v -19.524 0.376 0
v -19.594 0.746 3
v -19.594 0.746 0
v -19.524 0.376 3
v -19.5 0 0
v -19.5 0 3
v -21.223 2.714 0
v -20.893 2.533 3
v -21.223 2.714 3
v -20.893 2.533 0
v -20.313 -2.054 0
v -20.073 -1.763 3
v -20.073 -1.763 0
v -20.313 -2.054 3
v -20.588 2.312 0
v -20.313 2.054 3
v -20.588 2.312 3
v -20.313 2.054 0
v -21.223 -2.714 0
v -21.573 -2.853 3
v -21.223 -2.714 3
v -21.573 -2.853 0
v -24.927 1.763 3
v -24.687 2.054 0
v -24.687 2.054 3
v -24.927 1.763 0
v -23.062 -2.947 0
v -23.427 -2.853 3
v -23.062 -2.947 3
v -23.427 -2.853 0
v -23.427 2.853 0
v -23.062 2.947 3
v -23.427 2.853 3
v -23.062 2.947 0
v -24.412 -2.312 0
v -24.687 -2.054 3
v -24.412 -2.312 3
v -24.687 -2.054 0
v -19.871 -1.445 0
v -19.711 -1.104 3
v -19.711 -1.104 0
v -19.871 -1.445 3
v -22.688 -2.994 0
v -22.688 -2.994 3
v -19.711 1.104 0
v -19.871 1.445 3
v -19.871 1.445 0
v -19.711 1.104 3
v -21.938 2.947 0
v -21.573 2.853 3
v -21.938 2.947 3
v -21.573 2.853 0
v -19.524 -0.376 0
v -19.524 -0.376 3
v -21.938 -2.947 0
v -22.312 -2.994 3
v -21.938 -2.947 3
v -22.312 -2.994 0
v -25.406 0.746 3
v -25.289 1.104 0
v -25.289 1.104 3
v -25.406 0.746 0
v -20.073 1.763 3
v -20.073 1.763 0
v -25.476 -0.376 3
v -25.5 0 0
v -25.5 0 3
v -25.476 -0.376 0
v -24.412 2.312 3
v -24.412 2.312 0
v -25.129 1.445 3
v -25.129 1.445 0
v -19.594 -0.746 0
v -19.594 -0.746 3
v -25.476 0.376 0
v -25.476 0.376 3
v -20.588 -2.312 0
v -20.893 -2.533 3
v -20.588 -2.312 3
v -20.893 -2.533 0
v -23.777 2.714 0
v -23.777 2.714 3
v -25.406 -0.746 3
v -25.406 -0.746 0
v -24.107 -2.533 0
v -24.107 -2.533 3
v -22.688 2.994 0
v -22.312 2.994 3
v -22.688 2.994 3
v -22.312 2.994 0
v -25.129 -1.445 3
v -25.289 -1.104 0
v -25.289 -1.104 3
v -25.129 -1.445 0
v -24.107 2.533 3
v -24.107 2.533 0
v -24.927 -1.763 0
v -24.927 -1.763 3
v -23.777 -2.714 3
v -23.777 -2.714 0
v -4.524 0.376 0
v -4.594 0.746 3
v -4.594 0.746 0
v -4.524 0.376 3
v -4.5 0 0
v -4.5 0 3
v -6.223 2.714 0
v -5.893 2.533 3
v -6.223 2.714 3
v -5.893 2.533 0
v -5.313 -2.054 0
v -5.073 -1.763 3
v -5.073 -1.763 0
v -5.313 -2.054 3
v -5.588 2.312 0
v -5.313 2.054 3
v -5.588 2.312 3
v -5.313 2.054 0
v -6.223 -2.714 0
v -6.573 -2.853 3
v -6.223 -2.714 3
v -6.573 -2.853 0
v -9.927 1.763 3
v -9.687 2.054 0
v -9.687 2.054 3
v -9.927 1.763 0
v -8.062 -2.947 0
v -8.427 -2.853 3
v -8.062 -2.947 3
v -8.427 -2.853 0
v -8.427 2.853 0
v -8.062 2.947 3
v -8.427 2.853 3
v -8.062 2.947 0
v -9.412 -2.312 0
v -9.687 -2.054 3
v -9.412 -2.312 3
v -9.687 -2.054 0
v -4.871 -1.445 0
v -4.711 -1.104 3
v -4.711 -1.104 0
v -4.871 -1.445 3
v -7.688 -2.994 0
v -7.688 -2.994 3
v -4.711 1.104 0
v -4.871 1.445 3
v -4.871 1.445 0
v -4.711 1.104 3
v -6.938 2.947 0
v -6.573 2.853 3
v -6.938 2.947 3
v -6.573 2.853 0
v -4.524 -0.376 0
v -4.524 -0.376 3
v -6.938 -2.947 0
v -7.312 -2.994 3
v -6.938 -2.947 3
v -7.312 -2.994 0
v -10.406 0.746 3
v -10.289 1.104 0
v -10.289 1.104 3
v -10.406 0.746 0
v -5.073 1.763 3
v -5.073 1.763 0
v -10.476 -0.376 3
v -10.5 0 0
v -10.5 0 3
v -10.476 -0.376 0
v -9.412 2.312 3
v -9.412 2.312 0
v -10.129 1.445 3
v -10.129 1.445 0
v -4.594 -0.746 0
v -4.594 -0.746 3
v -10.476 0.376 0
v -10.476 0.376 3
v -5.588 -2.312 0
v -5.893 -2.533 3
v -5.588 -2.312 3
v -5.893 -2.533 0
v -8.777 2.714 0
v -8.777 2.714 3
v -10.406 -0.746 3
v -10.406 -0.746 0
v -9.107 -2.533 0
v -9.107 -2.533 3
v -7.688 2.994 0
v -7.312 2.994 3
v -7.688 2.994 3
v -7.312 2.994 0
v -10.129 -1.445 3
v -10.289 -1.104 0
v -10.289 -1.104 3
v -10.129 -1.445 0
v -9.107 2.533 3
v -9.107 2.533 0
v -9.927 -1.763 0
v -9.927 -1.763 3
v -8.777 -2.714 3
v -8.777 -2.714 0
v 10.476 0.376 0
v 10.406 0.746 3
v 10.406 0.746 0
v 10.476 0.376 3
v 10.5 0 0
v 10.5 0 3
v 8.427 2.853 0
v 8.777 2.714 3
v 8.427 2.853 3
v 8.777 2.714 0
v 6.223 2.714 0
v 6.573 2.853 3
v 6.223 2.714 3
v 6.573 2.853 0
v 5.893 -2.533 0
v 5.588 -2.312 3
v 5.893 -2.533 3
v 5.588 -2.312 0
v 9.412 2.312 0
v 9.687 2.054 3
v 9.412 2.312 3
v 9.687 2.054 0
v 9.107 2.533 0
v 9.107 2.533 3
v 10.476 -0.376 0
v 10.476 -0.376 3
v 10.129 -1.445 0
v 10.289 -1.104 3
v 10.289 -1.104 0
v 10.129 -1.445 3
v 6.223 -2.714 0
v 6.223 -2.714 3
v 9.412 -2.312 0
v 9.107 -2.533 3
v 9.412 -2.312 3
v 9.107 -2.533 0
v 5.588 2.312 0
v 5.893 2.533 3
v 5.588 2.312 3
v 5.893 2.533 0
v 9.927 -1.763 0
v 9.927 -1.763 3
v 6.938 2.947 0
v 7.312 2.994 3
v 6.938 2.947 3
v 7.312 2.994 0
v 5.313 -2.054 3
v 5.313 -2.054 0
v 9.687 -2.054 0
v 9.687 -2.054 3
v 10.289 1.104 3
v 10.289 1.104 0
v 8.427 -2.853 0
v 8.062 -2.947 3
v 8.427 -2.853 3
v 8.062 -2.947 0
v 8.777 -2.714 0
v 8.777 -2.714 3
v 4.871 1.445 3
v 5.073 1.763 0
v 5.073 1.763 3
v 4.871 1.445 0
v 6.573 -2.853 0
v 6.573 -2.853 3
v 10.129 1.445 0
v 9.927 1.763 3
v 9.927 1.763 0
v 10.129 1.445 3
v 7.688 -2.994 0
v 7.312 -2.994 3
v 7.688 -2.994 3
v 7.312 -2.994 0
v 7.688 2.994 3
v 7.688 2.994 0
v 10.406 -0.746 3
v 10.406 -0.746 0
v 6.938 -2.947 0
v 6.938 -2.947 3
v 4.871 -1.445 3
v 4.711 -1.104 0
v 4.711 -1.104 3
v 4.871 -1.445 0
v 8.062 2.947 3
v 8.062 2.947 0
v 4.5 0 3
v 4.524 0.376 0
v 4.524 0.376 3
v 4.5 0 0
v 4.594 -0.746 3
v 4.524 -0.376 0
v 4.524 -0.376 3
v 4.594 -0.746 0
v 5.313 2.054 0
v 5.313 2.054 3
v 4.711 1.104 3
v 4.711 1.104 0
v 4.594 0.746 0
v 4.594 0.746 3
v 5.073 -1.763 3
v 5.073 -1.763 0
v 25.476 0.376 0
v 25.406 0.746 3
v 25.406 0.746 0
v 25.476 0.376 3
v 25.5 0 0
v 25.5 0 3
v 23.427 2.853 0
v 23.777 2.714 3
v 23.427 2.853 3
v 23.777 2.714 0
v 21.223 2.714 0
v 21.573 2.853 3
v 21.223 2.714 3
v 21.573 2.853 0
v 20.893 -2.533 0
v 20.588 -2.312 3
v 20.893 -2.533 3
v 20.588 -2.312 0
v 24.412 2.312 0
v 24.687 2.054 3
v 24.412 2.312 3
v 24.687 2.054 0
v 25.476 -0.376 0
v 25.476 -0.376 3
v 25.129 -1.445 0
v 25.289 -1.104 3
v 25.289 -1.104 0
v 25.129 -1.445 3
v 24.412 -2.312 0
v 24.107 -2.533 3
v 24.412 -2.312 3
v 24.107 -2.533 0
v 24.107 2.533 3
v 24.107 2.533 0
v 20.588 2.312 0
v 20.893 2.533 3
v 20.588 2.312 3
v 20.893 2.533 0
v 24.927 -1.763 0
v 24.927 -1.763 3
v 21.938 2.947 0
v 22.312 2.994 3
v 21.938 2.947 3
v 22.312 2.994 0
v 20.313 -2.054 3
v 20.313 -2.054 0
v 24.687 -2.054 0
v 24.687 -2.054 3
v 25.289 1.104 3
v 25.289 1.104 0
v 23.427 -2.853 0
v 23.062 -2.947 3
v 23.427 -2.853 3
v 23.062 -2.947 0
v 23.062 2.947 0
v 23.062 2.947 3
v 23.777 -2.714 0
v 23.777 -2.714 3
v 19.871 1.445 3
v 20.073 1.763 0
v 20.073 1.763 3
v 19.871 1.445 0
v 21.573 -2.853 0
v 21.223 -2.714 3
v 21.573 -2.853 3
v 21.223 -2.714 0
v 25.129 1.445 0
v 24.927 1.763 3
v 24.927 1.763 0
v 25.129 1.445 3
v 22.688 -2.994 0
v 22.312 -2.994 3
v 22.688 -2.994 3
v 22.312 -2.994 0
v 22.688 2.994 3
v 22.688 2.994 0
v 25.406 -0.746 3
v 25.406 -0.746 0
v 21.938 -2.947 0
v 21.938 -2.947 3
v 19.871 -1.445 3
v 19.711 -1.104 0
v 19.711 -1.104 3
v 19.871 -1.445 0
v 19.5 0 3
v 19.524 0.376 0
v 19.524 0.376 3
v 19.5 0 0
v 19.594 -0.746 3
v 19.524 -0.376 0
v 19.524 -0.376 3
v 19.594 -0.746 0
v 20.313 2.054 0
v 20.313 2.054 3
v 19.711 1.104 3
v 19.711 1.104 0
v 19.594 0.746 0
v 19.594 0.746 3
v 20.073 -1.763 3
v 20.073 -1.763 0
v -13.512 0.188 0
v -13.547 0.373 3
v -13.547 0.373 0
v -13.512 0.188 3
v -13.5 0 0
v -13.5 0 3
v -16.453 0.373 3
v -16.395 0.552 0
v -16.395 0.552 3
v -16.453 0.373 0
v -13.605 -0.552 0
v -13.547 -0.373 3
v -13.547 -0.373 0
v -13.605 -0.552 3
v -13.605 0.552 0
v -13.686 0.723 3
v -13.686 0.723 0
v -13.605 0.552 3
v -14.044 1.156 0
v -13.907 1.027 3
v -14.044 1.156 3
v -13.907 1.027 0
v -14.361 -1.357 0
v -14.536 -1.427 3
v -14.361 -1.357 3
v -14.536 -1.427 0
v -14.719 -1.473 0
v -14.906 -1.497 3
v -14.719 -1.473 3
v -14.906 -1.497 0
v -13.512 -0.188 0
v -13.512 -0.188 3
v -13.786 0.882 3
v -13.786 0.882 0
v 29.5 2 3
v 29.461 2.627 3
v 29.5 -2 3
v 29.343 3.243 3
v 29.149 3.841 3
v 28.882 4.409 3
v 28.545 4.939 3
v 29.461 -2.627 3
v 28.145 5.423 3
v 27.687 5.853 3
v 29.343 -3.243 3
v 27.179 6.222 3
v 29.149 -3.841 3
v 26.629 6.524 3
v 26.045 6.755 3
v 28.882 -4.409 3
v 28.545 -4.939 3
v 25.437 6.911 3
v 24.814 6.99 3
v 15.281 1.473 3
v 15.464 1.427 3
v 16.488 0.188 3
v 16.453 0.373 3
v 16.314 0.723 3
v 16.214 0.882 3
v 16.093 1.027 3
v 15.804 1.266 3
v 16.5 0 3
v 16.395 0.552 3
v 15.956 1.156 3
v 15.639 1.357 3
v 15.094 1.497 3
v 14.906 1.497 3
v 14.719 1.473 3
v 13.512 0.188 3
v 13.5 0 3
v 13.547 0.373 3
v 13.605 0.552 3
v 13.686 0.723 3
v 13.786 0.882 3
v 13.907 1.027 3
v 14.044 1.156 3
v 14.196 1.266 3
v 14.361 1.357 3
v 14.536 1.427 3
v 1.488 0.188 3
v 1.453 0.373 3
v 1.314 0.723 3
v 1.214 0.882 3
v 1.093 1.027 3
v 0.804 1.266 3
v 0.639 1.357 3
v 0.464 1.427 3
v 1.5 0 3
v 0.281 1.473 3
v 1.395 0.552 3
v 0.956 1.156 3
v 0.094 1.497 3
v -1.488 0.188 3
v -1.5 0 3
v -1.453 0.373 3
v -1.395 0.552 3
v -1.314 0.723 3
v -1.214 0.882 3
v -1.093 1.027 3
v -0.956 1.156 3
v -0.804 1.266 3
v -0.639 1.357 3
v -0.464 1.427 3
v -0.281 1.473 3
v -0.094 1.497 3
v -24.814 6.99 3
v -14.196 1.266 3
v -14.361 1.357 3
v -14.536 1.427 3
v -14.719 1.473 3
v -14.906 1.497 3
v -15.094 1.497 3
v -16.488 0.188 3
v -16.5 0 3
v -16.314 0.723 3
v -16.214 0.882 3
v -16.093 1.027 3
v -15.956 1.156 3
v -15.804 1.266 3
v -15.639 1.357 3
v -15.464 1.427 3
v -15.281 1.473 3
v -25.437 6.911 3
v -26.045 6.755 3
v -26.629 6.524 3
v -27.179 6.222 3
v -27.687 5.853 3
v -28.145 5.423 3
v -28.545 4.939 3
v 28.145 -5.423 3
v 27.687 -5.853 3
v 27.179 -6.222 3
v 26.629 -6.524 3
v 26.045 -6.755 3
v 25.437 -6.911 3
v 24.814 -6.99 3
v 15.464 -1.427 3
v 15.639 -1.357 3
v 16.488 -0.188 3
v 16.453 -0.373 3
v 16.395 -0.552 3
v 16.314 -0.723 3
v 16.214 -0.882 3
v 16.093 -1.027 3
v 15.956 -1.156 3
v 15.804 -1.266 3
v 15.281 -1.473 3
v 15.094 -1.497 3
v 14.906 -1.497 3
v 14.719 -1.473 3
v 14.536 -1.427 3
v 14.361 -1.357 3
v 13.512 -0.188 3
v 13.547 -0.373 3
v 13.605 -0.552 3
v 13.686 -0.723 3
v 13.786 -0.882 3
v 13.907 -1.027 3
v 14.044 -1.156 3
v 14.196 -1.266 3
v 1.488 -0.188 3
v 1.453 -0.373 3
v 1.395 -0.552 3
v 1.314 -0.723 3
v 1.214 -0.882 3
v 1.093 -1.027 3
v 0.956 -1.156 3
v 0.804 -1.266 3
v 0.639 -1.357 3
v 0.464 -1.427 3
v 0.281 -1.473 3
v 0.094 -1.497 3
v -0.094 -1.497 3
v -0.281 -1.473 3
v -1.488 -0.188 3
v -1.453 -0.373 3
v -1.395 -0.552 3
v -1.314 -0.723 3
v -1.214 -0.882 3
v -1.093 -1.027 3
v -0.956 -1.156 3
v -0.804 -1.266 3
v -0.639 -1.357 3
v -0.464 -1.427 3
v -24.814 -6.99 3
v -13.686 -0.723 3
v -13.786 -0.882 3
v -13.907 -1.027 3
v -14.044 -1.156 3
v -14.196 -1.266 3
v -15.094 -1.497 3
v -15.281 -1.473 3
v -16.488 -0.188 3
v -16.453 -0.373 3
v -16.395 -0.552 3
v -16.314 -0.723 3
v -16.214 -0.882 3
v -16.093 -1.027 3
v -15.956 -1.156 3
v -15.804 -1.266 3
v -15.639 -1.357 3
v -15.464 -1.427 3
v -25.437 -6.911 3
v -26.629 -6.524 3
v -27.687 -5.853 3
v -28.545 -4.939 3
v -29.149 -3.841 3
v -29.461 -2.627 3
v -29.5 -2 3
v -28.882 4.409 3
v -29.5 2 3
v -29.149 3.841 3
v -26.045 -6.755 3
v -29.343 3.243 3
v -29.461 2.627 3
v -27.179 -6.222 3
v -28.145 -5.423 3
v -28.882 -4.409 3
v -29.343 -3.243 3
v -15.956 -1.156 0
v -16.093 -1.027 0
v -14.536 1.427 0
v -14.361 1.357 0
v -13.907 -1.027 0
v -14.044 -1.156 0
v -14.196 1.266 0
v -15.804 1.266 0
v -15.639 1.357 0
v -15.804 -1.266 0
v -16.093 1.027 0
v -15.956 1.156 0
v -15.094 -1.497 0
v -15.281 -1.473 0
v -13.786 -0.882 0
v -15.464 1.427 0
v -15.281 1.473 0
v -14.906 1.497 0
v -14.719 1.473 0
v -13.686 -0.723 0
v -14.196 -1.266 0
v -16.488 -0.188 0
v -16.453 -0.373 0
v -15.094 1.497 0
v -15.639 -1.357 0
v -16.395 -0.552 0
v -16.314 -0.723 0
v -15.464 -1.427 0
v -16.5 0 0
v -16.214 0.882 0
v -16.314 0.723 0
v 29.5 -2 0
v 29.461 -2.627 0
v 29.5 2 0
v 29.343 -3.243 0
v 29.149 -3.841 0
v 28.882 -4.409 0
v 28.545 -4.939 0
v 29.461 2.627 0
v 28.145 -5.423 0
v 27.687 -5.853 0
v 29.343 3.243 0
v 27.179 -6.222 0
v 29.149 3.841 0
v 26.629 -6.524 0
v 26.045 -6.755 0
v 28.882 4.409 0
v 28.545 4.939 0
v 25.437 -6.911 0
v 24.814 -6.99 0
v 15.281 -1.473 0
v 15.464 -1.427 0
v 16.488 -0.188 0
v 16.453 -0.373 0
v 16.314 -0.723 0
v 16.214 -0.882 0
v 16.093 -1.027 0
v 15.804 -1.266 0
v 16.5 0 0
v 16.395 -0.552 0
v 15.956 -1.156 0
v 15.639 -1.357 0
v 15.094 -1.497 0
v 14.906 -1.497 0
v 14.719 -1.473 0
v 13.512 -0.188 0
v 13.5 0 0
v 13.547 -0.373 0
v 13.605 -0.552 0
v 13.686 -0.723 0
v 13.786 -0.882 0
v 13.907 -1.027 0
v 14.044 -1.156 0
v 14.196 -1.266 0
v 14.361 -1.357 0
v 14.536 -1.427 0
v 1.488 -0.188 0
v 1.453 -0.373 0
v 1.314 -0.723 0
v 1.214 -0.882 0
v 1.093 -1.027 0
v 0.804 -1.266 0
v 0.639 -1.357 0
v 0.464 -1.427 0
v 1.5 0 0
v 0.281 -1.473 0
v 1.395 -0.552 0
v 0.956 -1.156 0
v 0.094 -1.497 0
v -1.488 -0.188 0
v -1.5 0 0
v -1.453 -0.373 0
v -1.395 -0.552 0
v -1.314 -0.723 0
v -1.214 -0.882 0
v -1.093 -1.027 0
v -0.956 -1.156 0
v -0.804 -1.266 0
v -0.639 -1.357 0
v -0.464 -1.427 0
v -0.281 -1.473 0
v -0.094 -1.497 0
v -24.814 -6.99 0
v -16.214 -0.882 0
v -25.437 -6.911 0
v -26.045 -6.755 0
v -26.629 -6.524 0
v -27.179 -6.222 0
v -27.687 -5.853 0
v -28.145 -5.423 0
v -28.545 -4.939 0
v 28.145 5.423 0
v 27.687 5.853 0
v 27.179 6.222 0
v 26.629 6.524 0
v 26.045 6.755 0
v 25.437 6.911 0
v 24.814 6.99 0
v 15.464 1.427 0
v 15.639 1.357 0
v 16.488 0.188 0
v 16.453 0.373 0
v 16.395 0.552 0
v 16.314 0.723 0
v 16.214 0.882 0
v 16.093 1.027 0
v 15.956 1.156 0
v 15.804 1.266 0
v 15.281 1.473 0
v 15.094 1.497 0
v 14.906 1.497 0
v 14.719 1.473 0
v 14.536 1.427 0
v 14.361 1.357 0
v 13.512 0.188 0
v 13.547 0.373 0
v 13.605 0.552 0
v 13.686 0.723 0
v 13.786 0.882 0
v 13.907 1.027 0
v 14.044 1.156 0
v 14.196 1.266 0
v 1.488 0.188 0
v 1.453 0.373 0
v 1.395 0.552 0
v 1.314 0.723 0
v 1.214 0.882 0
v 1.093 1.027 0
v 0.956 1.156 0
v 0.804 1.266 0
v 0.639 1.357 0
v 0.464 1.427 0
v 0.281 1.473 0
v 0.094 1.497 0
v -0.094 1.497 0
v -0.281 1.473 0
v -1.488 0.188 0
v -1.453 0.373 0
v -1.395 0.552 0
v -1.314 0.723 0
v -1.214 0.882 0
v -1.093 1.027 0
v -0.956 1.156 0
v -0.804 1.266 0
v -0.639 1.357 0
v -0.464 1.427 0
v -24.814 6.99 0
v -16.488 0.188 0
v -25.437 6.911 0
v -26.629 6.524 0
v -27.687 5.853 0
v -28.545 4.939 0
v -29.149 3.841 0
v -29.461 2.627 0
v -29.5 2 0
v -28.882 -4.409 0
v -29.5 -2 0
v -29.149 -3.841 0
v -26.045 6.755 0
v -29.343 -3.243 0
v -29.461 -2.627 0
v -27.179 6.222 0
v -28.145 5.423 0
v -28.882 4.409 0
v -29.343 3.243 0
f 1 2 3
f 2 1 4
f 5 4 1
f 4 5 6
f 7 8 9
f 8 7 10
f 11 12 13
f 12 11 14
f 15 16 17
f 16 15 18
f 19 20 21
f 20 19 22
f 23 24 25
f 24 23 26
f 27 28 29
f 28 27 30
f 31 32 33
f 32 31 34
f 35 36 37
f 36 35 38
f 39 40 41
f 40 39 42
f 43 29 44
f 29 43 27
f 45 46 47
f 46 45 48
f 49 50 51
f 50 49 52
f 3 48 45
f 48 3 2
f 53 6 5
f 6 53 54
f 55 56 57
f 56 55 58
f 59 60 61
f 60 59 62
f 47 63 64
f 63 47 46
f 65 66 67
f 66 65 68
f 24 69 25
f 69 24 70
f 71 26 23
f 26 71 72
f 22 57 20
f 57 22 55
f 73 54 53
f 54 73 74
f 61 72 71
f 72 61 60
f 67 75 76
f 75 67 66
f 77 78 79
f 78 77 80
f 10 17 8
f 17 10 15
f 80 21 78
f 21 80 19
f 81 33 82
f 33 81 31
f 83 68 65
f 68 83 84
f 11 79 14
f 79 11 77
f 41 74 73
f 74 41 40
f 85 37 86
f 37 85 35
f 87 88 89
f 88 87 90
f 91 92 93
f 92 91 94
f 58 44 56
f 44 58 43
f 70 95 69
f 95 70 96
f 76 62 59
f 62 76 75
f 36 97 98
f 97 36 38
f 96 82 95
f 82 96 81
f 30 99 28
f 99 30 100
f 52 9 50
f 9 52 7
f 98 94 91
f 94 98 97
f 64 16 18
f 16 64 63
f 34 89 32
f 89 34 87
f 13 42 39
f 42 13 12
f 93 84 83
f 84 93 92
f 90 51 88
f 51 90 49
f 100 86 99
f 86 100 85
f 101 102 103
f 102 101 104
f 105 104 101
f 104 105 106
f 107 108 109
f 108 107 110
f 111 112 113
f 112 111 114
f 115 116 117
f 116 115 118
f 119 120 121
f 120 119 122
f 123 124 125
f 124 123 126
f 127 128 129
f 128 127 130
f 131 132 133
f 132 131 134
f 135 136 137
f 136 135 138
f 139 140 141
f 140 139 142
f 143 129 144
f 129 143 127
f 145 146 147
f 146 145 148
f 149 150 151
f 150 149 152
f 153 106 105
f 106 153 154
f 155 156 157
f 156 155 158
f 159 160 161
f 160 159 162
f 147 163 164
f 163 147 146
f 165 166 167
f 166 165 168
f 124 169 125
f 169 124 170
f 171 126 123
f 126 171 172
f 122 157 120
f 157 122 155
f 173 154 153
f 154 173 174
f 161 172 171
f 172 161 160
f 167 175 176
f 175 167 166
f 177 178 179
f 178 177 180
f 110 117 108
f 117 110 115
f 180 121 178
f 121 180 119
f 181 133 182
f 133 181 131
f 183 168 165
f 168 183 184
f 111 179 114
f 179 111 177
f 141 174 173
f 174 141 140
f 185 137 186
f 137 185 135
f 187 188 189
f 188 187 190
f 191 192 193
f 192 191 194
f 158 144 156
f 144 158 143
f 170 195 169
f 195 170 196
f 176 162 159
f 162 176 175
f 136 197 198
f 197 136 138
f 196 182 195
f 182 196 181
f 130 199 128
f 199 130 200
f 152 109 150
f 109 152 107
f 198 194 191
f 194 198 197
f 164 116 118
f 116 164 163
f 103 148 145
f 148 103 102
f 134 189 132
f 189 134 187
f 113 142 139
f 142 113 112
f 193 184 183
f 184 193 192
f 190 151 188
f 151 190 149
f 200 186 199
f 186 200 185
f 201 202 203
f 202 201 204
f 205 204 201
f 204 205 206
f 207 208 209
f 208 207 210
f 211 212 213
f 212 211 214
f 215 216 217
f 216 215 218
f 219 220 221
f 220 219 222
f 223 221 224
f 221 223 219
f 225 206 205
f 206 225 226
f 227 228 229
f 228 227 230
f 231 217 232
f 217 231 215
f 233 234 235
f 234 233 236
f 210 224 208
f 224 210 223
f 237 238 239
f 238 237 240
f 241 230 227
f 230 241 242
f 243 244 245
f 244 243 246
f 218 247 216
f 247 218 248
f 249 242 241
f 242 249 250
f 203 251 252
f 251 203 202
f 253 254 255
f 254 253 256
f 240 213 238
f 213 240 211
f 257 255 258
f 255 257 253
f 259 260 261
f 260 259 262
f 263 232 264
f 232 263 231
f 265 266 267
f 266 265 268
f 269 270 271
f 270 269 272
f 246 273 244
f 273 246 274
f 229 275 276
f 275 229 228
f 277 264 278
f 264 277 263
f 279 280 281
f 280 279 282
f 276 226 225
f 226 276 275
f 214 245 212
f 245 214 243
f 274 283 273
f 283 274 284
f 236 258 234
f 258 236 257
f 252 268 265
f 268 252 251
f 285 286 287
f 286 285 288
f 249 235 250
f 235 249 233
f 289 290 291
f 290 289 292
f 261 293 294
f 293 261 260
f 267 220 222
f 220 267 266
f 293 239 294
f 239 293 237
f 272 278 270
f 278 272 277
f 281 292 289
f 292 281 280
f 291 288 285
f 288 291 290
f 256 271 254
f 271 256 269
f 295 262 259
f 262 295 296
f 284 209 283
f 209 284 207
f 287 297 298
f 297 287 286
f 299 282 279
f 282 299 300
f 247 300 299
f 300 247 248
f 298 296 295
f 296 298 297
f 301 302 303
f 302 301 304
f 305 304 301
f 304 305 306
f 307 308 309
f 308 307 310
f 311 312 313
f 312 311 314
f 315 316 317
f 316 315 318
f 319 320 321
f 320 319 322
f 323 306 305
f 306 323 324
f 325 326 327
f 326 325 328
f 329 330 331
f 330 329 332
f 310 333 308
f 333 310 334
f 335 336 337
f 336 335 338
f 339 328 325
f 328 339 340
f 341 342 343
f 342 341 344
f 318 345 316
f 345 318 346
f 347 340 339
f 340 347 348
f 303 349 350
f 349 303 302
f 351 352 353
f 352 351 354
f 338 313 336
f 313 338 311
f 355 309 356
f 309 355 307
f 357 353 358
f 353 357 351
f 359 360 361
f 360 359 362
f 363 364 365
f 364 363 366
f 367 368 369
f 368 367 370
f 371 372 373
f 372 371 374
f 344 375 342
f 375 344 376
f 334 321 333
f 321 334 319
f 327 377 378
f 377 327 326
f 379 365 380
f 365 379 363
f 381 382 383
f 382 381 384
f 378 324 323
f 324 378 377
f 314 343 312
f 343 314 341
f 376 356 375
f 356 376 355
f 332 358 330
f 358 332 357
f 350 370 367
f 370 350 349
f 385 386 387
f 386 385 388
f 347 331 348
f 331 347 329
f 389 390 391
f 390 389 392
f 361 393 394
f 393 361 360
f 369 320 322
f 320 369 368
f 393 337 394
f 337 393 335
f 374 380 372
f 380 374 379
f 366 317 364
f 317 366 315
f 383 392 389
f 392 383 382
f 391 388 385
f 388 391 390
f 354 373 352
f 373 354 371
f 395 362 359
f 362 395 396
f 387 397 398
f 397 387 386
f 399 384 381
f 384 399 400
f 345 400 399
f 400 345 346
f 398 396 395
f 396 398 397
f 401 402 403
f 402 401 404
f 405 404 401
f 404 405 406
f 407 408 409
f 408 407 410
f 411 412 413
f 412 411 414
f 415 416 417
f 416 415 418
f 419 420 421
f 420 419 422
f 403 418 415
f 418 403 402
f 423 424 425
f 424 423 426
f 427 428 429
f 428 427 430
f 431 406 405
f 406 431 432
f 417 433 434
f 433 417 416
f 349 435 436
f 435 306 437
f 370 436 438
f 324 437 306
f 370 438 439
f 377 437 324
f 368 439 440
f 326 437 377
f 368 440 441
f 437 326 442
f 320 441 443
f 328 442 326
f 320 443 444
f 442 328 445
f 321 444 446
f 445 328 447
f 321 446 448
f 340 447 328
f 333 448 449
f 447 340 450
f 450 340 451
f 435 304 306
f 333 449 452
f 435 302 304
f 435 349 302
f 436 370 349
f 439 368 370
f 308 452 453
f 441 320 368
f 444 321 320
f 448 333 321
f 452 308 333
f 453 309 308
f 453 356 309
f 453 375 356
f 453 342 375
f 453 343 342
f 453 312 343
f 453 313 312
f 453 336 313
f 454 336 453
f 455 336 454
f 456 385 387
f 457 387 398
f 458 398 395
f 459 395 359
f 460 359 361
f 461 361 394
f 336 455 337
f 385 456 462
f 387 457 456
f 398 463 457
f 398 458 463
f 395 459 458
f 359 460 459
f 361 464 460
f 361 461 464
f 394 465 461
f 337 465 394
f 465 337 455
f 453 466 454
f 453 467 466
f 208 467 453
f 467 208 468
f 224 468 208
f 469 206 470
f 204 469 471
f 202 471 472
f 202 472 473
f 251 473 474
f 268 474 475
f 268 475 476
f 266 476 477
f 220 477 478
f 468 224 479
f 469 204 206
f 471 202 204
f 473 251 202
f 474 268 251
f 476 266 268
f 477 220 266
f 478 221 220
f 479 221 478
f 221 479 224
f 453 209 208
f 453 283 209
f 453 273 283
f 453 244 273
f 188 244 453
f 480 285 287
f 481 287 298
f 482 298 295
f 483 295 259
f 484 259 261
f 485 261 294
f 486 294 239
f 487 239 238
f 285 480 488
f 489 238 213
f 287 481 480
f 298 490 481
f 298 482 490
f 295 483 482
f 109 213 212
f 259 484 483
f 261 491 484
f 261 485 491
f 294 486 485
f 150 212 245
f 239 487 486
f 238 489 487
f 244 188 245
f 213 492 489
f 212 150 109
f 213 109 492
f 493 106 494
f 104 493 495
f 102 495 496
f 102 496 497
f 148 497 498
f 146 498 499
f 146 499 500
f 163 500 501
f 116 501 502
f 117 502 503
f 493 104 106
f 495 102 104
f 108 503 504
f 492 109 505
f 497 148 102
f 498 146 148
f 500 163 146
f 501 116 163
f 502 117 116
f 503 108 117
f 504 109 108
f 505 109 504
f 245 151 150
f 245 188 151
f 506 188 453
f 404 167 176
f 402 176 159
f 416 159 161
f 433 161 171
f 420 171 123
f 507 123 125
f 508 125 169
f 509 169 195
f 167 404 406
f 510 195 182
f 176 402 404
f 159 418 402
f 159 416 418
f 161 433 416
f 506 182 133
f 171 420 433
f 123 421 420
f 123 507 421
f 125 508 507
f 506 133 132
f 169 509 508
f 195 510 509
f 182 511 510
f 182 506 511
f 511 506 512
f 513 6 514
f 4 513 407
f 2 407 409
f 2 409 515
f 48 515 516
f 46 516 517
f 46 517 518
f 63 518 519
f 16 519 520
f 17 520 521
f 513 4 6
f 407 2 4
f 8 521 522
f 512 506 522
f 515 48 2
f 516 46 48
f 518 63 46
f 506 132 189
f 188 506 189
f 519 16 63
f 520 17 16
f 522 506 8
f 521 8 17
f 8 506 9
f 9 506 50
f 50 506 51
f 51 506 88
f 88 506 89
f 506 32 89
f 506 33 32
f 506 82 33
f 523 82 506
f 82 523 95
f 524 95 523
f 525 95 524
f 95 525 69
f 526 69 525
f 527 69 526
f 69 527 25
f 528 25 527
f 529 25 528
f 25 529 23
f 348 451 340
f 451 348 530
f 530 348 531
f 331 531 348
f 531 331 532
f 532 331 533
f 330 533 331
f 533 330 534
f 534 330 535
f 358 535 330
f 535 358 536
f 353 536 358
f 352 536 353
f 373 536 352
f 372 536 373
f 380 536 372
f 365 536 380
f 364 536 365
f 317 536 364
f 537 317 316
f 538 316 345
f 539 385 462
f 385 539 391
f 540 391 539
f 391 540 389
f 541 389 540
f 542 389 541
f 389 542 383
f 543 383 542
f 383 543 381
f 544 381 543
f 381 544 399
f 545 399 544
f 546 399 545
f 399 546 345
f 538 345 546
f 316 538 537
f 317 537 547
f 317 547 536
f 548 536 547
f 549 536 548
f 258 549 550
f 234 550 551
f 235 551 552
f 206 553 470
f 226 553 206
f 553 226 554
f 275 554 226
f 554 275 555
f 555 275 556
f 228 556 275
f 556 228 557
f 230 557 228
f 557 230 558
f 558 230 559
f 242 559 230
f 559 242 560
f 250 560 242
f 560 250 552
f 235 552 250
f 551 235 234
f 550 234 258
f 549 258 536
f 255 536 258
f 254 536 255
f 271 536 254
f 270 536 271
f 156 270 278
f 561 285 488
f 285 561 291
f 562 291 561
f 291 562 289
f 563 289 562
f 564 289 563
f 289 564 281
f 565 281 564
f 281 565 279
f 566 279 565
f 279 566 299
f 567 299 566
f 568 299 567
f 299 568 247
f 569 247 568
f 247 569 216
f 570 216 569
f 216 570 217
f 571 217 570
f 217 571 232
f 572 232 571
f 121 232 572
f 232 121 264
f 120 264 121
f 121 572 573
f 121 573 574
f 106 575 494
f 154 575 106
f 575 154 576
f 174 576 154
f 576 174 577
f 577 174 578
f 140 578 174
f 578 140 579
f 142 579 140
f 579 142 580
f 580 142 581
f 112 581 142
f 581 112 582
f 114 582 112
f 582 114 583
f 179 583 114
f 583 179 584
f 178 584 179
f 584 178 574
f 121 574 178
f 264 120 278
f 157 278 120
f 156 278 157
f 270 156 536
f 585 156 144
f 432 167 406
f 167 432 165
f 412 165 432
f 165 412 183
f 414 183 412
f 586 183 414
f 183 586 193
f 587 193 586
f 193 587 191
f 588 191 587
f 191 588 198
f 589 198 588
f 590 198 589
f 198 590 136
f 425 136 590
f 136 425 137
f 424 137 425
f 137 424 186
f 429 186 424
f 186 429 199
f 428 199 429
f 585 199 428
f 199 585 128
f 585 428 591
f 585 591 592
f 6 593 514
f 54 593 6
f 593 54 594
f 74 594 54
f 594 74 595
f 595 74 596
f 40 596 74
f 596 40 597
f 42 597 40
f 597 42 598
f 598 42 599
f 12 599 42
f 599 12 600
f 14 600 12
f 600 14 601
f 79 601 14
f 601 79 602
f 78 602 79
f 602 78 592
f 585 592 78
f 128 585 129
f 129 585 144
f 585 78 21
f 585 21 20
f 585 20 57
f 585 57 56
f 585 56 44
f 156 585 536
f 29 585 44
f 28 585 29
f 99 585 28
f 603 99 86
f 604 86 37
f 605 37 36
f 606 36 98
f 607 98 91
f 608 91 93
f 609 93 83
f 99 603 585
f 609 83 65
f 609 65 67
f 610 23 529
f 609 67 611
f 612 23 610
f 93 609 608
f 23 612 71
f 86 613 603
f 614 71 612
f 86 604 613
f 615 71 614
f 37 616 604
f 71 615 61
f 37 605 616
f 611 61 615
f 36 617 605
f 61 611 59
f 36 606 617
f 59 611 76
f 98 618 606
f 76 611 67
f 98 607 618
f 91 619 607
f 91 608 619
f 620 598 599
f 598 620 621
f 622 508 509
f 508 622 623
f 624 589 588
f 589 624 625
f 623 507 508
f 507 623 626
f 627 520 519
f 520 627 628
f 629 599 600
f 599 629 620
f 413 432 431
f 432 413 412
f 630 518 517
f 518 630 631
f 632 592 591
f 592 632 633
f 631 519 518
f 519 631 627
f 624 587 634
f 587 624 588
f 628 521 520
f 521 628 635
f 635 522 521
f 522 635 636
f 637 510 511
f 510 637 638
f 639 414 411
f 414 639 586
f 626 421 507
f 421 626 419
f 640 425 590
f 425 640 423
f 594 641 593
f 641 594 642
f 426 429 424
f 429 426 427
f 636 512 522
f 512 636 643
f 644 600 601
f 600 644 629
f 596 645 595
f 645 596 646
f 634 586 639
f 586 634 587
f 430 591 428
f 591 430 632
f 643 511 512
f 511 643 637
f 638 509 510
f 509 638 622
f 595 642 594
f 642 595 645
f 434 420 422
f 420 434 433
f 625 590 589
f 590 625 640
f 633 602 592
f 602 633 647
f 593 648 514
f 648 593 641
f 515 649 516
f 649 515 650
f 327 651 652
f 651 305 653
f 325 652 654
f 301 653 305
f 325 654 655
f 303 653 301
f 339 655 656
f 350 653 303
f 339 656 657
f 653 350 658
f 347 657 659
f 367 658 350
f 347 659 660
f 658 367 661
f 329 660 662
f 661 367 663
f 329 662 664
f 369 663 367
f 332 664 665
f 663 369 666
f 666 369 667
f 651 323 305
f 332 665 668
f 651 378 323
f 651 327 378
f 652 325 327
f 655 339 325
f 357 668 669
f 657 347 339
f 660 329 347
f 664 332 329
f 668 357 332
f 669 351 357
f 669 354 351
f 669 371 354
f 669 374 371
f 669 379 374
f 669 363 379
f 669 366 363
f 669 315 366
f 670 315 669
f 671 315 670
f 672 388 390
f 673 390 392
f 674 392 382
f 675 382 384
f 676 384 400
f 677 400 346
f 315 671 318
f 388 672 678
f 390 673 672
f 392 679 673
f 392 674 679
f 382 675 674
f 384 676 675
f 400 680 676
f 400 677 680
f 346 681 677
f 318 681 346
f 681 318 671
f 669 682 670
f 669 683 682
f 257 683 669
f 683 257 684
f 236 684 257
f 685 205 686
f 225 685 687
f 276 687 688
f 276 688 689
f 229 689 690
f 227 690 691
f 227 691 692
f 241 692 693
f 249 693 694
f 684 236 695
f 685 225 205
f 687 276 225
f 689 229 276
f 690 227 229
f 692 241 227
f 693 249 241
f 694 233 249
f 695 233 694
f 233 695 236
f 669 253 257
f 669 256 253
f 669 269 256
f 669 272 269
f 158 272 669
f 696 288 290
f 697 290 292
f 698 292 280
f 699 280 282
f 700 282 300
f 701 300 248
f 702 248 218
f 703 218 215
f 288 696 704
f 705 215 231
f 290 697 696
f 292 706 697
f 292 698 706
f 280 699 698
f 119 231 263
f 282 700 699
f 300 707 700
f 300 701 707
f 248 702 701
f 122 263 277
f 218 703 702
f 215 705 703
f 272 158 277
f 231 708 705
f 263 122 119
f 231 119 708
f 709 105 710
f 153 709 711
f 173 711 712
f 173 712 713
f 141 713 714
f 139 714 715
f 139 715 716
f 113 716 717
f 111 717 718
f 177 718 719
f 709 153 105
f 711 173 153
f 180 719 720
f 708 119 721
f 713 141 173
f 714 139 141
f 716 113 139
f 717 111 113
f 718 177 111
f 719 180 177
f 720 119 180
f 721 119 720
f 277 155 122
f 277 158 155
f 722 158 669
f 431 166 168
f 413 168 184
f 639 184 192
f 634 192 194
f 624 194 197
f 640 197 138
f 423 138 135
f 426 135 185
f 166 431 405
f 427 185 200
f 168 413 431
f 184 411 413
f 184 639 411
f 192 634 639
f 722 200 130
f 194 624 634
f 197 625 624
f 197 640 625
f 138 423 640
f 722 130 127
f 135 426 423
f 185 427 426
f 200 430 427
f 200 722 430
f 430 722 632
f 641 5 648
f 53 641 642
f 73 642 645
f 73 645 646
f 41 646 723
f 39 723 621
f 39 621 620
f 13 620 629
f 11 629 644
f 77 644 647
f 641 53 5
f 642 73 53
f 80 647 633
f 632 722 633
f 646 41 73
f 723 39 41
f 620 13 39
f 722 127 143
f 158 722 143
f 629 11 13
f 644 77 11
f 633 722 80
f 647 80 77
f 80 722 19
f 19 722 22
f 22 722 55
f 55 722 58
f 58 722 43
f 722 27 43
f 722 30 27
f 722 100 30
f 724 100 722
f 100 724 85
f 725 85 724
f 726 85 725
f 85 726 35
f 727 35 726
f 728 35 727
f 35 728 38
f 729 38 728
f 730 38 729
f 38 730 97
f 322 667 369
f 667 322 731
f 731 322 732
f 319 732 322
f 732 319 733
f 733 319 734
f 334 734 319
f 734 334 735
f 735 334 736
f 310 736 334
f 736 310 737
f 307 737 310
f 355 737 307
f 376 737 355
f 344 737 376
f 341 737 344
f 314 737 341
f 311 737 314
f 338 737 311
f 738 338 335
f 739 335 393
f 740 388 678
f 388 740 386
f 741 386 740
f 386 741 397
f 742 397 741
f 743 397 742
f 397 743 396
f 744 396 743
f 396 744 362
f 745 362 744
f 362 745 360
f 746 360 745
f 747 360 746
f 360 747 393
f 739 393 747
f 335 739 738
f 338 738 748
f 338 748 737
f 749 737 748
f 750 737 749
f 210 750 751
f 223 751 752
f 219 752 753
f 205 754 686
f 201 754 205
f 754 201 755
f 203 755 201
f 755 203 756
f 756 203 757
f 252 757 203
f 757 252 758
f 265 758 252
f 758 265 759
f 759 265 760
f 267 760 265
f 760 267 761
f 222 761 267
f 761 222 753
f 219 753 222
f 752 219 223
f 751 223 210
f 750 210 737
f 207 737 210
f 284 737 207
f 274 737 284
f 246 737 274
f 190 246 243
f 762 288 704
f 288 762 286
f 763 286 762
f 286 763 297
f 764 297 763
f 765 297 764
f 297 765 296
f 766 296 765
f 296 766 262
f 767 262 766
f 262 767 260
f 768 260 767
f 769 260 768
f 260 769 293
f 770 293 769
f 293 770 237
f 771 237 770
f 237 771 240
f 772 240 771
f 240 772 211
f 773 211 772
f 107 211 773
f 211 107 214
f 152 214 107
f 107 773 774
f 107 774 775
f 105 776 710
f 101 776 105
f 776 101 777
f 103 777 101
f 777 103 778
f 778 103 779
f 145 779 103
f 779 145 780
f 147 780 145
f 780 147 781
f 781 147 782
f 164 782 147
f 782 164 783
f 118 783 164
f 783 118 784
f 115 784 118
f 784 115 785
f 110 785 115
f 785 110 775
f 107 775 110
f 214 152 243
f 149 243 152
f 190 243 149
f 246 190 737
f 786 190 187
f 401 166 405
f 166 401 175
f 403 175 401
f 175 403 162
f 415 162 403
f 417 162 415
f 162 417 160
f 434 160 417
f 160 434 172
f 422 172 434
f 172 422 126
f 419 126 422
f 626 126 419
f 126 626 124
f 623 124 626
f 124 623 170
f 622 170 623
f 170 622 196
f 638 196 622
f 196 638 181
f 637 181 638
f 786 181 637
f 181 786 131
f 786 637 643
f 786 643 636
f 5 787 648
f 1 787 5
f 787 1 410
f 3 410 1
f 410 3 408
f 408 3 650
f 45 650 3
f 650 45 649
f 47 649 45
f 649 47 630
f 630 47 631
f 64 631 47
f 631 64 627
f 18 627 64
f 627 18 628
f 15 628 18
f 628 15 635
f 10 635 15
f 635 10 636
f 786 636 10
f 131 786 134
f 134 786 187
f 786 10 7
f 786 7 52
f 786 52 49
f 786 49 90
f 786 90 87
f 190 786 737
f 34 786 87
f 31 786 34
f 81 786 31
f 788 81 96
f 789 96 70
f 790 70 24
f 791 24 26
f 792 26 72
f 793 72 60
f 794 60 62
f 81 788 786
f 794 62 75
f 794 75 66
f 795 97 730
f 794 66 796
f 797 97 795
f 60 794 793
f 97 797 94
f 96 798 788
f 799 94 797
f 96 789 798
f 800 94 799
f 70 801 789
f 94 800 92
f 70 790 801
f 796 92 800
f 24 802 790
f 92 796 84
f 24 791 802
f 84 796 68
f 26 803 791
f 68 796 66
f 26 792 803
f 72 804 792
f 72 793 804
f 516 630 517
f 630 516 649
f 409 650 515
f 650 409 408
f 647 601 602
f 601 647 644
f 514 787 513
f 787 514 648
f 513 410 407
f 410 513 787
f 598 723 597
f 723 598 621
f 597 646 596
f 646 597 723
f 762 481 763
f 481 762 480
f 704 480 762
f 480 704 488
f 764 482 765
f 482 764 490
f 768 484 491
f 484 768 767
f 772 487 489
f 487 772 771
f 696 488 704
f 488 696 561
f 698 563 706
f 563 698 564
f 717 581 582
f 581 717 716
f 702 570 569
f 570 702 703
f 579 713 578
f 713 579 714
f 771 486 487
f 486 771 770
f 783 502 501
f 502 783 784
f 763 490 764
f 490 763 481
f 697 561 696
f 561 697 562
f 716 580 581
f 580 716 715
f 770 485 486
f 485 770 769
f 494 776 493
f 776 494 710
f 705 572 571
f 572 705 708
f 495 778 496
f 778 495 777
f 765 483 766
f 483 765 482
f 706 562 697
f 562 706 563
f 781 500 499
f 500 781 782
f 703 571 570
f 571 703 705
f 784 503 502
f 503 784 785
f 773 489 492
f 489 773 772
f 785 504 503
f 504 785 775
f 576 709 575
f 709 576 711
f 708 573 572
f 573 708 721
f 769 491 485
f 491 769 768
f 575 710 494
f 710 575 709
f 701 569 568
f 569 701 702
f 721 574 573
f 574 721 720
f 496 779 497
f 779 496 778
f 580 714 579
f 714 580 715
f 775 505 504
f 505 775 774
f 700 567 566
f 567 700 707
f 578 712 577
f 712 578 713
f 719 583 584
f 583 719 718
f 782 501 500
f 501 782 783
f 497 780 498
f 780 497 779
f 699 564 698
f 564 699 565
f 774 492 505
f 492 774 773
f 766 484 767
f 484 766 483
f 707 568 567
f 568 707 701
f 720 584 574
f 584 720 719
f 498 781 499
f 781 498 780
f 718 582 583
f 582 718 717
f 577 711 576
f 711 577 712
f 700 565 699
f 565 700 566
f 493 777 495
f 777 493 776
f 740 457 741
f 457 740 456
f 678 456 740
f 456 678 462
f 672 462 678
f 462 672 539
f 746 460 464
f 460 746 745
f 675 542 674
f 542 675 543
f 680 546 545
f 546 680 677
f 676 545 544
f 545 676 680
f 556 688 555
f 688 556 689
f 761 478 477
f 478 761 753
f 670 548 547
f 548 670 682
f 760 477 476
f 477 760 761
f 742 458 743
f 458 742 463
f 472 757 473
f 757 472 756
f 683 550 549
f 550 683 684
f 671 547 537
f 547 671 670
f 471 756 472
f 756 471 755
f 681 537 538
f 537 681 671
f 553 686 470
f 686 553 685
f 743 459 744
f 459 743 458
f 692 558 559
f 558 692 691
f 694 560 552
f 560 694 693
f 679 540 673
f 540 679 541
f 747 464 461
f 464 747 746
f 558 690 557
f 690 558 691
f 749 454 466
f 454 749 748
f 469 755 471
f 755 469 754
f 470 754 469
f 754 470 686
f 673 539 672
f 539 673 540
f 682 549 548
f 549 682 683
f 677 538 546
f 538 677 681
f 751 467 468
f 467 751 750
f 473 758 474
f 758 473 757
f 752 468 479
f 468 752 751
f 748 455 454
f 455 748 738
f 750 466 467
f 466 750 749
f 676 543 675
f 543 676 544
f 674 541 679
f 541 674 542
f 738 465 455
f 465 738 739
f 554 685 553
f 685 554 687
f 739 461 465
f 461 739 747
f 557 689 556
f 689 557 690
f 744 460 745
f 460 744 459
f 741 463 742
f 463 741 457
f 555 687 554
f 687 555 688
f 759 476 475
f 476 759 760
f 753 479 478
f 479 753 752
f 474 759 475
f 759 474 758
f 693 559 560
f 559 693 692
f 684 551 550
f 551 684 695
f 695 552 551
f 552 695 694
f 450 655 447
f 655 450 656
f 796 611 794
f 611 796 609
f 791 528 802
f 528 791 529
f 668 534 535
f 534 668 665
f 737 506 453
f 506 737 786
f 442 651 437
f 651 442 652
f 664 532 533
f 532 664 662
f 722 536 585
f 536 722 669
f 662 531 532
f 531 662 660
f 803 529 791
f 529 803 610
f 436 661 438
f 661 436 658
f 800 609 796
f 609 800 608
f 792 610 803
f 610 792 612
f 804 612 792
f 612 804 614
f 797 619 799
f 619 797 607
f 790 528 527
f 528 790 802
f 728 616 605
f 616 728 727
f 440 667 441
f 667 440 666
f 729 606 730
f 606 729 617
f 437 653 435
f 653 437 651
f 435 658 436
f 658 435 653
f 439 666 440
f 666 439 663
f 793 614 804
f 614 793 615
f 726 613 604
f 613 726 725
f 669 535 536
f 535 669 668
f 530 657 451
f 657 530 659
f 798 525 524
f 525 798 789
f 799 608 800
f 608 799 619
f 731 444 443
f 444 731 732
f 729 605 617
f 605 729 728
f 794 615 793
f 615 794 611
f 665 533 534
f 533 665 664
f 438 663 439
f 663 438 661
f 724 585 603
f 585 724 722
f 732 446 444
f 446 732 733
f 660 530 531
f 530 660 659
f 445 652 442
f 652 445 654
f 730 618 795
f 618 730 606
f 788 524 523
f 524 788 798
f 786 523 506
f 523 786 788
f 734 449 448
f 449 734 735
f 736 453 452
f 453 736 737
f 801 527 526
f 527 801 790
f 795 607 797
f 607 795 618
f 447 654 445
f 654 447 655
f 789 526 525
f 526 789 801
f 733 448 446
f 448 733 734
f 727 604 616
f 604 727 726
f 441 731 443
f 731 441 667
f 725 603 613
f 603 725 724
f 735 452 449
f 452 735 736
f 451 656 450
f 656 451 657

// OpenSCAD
$fn = 50;


difference() {
	union() {
		hull() {
			translate(v = [-24.5000000000, 2.0000000000, 0]) {
				cylinder(h = 3, r = 5);
			}
			translate(v = [24.5000000000, 2.0000000000, 0]) {
				cylinder(h = 3, r = 5);
			}
			translate(v = [-24.5000000000, -2.0000000000, 0]) {
				cylinder(h = 3, r = 5);
			}
			translate(v = [24.5000000000, -2.0000000000, 0]) {
				cylinder(h = 3, r = 5);
			}
		}
	}
	union() {
		translate(v = [-22.5000000000, 0.0000000000, -100.0000000000]) {
			cylinder(h = 200, r = 3.0000000000);
		}
		translate(v = [-7.5000000000, 0.0000000000, -100.0000000000]) {
			cylinder(h = 200, r = 3.0000000000);
		}
		translate(v = [7.5000000000, 0.0000000000, -100.0000000000]) {
			cylinder(h = 200, r = 3.0000000000);
		}
		translate(v = [22.5000000000, 0.0000000000, -100.0000000000]) {
			cylinder(h = 200, r = 3.0000000000);
		}
		translate(v = [-22.5000000000, 0.0000000000, 0]) {
			cylinder(h = 3, r = 1.5000000000);
		}
		translate(v = [-15.0000000000, 0.0000000000, 0]) {
			cylinder(h = 3, r = 1.5000000000);
		}
		translate(v = [-7.5000000000, 0.0000000000, 0]) {
			cylinder(h = 3, r = 1.5000000000);
		}
		cylinder(h = 3, r = 1.5000000000);
		translate(v = [7.5000000000, 0.0000000000, 0]) {
			cylinder(h = 3, r = 1.5000000000);
		}
		translate(v = [15.0000000000, 0.0000000000, 0]) {
			cylinder(h = 3, r = 1.5000000000);
		}
		translate(v = [22.5000000000, 0.0000000000, 0]) {
			cylinder(h = 3, r = 1.5000000000);
		}
		translate(v = [-22.5000000000, 0.0000000000, 0]) {
			cylinder(h = 3, r = 1.5000000000);
		}
		translate(v = [-15.0000000000, 0.0000000000, 0]) {
			cylinder(h = 3, r = 1.5000000000);
		}
		translate(v = [-7.5000000000, 0.0000000000, 0]) {
			cylinder(h = 3, r = 1.5000000000);
		}
		cylinder(h = 3, r = 1.5000000000);
		translate(v = [7.5000000000, 0.0000000000, 0]) {
			cylinder(h = 3, r = 1.5000000000);
		}
		translate(v = [15.0000000000, 0.0000000000, 0]) {
			cylinder(h = 3, r = 1.5000000000);
		}
		translate(v = [22.5000000000, 0.0000000000, 0]) {
			cylinder(h = 3, r = 1.5000000000);
		}
		translate(v = [-22.5000000000, 0.0000000000, 0]) {
			cylinder(h = 3, r = 1.5000000000);
		}
		translate(v = [-15.0000000000, 0.0000000000, 0]) {
			cylinder(h = 3, r = 1.5000000000);
		}
		translate(v = [-7.5000000000, 0.0000000000, 0]) {
			cylinder(h = 3, r = 1.5000000000);
		}
		cylinder(h = 3, r = 1.5000000000);
		translate(v = [7.5000000000, 0.0000000000, 0]) {
			cylinder(h = 3, r = 1.5000000000);
		}
		translate(v = [15.0000000000, 0.0000000000, 0]) {
			cylinder(h = 3, r = 1.5000000000);
		}
		translate(v = [22.5000000000, 0.0000000000, 0]) {
			cylinder(h = 3, r = 1.5000000000);
		}
	}
}
